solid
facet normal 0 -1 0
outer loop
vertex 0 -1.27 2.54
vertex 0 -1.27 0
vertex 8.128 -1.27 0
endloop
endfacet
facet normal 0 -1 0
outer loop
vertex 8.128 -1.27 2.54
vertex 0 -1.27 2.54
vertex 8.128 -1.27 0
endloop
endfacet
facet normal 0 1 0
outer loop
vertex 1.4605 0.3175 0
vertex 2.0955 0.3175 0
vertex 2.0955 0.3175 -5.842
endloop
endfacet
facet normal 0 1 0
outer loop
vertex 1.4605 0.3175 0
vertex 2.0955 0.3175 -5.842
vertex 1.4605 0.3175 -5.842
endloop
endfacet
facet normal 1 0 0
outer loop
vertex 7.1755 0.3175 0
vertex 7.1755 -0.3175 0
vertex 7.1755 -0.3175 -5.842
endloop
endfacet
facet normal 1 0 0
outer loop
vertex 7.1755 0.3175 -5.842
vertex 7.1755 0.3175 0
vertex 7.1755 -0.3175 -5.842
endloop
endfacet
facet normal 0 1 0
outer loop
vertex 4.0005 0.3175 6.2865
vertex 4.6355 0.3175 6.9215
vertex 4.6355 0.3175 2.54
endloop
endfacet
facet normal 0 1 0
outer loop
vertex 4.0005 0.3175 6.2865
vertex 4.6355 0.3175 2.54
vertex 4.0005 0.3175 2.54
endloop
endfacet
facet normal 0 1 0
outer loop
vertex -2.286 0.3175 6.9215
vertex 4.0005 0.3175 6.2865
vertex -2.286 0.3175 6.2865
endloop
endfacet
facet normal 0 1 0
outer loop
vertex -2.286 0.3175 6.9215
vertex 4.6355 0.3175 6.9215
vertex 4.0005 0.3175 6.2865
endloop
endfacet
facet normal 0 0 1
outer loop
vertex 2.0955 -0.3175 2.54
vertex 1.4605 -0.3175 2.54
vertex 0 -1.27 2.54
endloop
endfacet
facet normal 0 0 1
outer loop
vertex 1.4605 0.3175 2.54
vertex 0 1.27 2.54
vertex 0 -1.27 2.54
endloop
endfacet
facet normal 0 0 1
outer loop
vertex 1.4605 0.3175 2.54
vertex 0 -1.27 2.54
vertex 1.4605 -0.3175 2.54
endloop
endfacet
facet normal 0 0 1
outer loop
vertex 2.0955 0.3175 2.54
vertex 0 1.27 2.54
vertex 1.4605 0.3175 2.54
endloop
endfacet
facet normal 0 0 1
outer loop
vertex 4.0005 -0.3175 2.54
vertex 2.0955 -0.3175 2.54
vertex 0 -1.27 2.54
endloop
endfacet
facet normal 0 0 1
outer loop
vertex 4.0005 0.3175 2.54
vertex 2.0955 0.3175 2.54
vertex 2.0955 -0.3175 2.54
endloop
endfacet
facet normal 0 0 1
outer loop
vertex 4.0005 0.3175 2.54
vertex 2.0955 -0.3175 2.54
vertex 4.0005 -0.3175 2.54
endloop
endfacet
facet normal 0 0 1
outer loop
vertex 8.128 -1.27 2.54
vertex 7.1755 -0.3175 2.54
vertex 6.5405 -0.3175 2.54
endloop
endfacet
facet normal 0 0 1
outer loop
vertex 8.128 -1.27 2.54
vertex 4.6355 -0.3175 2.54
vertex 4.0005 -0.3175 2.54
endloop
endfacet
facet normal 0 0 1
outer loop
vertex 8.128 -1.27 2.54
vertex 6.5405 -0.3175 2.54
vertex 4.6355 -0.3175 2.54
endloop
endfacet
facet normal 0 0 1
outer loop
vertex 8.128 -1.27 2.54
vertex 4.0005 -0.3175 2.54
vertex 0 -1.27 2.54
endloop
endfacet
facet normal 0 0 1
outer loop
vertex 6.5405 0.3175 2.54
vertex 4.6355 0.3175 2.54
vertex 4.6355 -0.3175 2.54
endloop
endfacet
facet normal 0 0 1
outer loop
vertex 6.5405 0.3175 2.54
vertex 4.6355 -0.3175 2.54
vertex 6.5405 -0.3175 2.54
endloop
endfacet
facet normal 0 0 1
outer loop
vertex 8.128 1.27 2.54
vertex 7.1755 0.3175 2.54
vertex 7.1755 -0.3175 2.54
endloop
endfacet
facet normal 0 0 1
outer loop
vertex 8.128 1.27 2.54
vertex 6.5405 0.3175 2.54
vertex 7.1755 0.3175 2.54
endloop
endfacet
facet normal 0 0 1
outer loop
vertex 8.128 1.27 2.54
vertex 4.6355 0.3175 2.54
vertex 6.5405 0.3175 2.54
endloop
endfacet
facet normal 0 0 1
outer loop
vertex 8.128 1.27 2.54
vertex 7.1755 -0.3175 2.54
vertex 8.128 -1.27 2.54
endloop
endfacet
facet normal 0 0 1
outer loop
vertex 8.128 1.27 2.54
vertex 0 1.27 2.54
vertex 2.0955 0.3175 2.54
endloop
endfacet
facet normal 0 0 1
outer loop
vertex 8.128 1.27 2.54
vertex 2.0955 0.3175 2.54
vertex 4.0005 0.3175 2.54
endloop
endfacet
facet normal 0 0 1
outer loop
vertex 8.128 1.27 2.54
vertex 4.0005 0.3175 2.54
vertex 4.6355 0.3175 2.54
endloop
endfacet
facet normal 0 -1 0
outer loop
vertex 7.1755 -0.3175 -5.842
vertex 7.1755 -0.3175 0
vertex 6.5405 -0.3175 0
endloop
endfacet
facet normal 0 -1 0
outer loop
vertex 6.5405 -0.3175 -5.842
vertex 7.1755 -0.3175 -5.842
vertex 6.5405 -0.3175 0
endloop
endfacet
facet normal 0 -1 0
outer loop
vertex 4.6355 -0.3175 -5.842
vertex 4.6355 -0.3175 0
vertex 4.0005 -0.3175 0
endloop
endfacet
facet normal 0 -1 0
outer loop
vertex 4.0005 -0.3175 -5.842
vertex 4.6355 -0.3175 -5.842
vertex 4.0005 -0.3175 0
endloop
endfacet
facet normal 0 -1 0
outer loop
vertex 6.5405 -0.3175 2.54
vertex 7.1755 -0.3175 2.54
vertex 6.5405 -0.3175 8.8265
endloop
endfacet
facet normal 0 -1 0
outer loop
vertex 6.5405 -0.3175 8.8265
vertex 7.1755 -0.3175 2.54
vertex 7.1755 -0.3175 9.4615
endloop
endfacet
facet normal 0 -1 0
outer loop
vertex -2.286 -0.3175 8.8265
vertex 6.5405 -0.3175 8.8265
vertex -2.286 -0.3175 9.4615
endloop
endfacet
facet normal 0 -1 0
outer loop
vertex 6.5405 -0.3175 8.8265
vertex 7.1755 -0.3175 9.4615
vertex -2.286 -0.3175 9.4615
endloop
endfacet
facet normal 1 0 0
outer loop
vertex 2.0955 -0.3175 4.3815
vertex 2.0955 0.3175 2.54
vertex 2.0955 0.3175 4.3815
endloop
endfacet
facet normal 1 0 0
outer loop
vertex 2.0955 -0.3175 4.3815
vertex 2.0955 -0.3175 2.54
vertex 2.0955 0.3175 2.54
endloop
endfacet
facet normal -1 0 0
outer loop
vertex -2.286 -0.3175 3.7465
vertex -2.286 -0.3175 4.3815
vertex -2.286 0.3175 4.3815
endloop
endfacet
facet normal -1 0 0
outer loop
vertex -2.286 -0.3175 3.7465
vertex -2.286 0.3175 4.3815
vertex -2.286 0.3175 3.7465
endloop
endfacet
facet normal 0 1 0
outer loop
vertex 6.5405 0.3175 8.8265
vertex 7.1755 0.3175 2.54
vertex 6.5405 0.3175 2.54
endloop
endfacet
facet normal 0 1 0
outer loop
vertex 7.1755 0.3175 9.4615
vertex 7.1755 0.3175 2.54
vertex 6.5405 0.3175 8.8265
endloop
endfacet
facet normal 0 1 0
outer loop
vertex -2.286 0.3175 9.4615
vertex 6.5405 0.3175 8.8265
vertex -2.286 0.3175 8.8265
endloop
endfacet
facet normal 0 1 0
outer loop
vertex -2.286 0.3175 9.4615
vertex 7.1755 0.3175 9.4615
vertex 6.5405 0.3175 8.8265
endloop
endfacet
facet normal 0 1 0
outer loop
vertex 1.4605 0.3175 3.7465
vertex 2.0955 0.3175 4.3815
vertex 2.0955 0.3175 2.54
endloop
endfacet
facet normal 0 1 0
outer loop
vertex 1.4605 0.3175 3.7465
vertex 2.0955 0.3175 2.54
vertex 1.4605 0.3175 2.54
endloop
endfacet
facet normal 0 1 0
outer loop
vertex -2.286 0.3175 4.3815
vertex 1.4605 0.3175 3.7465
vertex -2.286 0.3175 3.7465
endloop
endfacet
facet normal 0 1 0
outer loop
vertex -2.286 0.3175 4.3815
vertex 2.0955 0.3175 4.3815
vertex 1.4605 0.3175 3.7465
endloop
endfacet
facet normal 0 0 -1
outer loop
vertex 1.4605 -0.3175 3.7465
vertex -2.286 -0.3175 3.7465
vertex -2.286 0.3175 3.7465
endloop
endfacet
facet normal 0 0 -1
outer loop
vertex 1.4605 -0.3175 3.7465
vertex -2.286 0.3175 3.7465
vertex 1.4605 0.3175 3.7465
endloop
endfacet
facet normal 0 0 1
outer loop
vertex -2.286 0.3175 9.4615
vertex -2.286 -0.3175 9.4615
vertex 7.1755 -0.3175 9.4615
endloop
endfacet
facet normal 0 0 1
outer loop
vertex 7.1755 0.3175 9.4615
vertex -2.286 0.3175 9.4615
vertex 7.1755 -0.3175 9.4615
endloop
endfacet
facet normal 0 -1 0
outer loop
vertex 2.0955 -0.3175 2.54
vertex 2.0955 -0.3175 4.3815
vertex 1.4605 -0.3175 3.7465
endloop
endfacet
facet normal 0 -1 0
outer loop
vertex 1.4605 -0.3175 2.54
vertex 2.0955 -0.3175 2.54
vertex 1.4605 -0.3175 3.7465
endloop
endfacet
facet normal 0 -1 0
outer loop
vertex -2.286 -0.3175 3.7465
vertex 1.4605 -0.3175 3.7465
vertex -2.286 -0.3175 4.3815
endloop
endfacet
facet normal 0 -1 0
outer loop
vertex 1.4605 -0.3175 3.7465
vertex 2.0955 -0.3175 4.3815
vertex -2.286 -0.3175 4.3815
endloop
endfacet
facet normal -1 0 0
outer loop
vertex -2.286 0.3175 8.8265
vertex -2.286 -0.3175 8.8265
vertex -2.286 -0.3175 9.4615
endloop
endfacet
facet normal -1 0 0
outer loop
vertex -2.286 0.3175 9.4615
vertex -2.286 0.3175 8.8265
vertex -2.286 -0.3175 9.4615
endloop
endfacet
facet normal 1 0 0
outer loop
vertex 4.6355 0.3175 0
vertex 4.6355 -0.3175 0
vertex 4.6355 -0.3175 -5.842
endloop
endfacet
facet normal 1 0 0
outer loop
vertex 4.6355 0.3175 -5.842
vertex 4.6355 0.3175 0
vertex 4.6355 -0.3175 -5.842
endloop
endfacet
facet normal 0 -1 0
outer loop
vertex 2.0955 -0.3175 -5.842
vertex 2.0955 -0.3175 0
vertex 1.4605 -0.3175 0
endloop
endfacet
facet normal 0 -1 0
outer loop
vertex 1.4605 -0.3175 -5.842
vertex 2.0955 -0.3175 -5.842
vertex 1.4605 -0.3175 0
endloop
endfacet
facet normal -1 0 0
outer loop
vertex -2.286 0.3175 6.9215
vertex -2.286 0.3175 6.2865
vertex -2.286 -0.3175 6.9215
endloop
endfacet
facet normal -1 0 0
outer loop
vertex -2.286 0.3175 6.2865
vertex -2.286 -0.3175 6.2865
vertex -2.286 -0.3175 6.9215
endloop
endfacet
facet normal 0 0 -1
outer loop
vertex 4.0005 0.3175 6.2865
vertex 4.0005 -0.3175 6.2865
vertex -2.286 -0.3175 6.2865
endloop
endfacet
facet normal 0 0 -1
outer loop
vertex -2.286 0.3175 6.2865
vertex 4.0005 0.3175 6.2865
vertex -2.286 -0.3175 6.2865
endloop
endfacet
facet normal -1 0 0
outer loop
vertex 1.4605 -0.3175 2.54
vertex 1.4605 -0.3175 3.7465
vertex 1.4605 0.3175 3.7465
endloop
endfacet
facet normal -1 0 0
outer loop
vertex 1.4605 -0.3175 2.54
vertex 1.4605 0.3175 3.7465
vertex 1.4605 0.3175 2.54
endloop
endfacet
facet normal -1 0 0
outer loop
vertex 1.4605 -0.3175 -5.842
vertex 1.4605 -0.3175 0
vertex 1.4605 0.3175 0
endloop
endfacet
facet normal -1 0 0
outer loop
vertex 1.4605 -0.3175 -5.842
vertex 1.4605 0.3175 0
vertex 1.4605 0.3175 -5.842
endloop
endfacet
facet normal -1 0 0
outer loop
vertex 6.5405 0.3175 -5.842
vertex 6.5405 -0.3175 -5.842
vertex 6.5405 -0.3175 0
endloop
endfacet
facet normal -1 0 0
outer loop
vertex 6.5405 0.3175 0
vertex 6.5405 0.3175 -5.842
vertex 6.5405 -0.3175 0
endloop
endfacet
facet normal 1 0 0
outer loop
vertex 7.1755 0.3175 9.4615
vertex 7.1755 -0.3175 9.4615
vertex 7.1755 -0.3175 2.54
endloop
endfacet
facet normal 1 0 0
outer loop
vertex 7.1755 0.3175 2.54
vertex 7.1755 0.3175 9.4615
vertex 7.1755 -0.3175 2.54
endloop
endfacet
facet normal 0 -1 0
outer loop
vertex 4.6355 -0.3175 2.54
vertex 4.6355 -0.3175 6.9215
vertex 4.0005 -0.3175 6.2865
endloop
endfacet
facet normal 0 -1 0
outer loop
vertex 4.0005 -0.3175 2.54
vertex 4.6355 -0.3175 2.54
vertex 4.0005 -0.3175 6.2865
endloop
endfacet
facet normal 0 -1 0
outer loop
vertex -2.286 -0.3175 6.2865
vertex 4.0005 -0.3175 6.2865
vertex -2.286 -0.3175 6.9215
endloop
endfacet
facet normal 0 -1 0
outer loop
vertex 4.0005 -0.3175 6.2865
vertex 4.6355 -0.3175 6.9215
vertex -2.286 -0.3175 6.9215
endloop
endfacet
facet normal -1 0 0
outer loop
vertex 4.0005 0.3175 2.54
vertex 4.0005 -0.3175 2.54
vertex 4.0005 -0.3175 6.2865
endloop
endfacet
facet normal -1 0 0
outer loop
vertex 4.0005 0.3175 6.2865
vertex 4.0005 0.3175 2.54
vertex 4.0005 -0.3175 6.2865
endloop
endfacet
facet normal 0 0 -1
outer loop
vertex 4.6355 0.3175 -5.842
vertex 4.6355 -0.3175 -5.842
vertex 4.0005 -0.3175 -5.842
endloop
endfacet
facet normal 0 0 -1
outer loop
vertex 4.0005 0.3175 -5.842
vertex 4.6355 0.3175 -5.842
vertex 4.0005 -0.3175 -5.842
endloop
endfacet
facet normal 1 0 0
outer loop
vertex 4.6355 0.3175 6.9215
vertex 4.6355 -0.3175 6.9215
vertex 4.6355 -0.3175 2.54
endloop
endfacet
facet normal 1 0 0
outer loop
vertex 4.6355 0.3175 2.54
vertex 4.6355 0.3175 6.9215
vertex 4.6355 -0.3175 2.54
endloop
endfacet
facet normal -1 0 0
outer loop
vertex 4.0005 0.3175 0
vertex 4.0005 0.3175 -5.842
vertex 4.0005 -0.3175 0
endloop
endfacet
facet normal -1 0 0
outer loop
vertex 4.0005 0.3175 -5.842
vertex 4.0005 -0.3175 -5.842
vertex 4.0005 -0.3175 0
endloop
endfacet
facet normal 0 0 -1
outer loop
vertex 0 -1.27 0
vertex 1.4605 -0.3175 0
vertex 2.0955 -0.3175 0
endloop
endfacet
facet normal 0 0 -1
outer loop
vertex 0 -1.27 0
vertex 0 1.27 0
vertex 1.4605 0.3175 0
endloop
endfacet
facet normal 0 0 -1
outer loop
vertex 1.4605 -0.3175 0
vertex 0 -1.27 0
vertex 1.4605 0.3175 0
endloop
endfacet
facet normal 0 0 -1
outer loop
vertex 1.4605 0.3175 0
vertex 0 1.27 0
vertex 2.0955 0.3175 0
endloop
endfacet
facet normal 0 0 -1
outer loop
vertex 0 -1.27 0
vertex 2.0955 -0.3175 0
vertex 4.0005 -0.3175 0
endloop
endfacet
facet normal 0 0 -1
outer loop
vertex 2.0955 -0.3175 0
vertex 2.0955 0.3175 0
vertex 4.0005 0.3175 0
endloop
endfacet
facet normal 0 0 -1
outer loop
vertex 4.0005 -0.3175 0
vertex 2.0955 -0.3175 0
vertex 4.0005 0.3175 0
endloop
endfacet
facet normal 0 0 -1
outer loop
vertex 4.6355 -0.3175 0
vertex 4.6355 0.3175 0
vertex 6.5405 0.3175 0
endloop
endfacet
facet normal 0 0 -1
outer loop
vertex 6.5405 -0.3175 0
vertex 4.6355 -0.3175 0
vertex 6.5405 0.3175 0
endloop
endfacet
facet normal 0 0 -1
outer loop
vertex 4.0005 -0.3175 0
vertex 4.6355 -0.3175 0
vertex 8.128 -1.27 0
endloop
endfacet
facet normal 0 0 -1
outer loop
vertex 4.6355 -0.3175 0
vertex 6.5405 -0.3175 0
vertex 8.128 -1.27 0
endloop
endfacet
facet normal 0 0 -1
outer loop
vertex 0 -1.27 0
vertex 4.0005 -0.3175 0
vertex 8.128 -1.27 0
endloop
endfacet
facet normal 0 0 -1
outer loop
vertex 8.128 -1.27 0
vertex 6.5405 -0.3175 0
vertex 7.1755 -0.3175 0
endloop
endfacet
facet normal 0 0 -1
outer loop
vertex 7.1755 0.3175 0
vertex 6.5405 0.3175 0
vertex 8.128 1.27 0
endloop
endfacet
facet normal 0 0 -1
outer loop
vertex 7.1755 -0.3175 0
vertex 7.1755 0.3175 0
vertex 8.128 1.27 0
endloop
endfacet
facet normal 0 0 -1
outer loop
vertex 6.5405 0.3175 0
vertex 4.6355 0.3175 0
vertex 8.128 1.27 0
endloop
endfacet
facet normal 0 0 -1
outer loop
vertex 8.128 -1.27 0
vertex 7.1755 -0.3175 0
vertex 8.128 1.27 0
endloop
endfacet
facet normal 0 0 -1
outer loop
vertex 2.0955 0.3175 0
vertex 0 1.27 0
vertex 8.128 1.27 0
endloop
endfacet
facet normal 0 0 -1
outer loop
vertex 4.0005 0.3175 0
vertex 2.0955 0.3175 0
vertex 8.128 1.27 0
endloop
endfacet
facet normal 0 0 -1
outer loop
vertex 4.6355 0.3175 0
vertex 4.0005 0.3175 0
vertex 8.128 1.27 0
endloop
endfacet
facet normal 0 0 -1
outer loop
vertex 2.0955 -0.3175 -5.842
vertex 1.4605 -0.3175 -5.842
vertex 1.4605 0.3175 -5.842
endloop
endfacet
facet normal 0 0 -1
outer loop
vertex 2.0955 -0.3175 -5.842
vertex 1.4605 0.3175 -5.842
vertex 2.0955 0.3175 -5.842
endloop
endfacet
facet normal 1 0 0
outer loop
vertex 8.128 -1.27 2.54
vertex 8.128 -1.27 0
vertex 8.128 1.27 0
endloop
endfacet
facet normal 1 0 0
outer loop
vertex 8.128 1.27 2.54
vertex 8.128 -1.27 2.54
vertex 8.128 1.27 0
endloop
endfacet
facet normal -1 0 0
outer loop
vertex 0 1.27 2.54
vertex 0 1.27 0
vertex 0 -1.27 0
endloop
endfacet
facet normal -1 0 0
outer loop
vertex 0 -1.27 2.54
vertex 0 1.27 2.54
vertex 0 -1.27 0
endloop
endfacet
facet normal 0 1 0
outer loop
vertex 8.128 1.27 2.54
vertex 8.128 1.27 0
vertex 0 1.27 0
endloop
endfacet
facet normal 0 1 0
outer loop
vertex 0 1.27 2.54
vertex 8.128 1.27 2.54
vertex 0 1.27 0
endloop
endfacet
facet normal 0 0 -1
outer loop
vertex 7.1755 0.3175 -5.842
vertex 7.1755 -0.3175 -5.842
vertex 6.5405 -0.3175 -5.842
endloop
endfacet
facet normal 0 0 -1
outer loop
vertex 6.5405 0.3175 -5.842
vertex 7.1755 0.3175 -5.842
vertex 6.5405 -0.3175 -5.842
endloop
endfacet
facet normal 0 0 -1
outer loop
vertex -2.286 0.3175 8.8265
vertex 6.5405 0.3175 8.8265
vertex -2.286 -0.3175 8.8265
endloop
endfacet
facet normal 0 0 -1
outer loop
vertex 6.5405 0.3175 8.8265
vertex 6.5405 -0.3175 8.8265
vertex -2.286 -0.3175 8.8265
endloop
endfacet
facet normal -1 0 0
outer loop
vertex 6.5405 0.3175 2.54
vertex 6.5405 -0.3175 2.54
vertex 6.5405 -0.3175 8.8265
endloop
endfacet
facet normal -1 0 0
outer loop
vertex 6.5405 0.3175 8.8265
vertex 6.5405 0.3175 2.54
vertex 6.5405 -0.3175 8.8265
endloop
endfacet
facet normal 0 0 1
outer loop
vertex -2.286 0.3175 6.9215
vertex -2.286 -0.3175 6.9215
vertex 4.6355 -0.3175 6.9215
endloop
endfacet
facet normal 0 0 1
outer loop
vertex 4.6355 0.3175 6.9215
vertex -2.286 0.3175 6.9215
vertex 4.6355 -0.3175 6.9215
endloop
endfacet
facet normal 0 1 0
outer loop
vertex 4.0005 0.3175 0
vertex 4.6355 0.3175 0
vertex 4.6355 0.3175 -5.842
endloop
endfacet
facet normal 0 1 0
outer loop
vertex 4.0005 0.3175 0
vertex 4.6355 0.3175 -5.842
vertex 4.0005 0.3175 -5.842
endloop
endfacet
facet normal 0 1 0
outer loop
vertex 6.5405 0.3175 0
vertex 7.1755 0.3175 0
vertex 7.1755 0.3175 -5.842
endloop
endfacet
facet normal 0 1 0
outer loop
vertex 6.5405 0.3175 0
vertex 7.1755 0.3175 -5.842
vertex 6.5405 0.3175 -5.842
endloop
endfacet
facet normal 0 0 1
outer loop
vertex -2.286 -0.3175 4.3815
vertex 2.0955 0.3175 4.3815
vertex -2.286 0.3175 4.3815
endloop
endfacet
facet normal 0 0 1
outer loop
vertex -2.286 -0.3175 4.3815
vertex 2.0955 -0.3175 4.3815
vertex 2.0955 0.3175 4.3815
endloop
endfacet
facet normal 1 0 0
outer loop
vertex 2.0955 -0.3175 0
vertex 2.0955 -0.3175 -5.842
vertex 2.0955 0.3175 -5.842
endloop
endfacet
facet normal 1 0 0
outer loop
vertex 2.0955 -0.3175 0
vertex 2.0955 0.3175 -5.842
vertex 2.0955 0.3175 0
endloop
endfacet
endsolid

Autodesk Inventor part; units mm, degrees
ref_plane "YZ Plane" through (0, 0, 0) normal (1, 0, 0) x (0, 1, 0)
ref_plane "XZ Plane" through (0, 0, 0) normal (0, 1, 0) x (-1, 0, 0)
ref_plane "XY Plane" through (0, 0, 0) normal (0, 0, 1) x (1, 0, 0)
sketch "Sketch1" plane through (0, 0, 0) normal (0, 1, 0) x (-1, 0, 0)
  line L0 (-1.4605, -5.842) -> (-2.0955, -5.842)
  line L1 (-2.0955, -5.842) -> (-2.0955, 4.3815)
  line L2 (-2.0955, 4.3815) -> (2.286, 4.3815)
  line L3 (2.286, 4.3815) -> (2.286, 3.7465)
  line L4 (2.286, 3.7465) -> (-1.4605, 3.7465)
  line L5 (-1.4605, 3.7465) -> (-1.4605, -5.842)
  line L6 (2.286, 6.2865) -> (2.286, 6.9215)
  line L7 (2.286, 6.9215) -> (-4.6355, 6.9215)
  line L8 (-4.6355, 6.9215) -> (-4.6355, -5.842)
  line L9 (-4.6355, -5.842) -> (-4.0005, -5.842)
  line L10 (-4.0005, -5.842) -> (-4.0005, 6.2865)
  line L11 (-4.0005, 6.2865) -> (2.286, 6.2865)
  line L12 (2.286, 8.8265) -> (2.286, 9.4615)
  line L13 (2.286, 9.4615) -> (-7.1755, 9.4615)
  line L14 (-7.1755, 9.4615) -> (-7.1755, -5.842)
  line L15 (-7.1755, -5.842) -> (-6.5405, -5.842)
  line L16 (-6.5405, -5.842) -> (-6.5405, 8.8265)
  line L17 (-6.5405, 8.8265) -> (2.286, 8.8265)
  line L18 (2.286, 4.064) -> (9.1077, 4.064) construction
  line L19 (2.286, 6.604) -> (8.649, 6.604) construction
  line L20 (2.286, 9.144) -> (8.4197, 9.144) construction
  line L21 (-1.778, -5.842) -> (-1.778, -10.327) construction
  line L22 (-4.318, -5.842) -> (-4.318, -10.188) construction
  line L23 (-6.858, -5.842) -> (-6.858, -10.8865) construction
  line L24 (12.5548, 0) -> (-11.5751, 0) construction
  line L25 (0, -14.9561) -> (0, 13.5311) construction
  line L26 (0, 0) -> (-8.128, 0) construction
  line L27 (-8.128, 0) -> (-8.128, 2.54) construction
  line L28 (-8.128, 2.54) -> (0, 2.54) construction
  line L29 (0, 2.54) -> (0, 0) construction
  line L30 (-2.54, 0) -> (-2.54, 2.54) construction
  dimension "d24" = 2.54
  dimension "d25" = 2.54
  dimension "d26" = 2.54
  dimension "d27" = 2.54
  dimension "d29" = 0.635
  dimension "d30" = 5.842
  dimension "d32" = 2.54
  dimension "d33" = 8.128
  dimension "d34" = 2.286
  dimension "d35" = 1.778
  dimension "d36" = 1.524
  dimension "d44" = 2.54
  dimension "d45" = 4.826
extrude "Extrusion1" add sketch "Sketch1" along normal mid plane 0.635
sketch "Sketch3" plane through (0, 0, 0) normal (0, 0, 1) x (1, 0, 0)
  line L0 (0, -1.27) -> (8.128, -1.27)
  line L1 (8.128, -1.27) -> (8.128, 1.27)
  line L2 (8.128, 1.27) -> (0, 1.27)
  line L3 (0, 1.27) -> (0, -1.27)
  line L4 (1.4605, 0.3175) -> (1.4605, -0.3175) projected
  line L5 (1.4605, -0.3175) -> (1.4605, 0.3175) projected
  line L6 (2.0955, 0.3175) -> (1.4605, 0.3175) projected
  line L7 (1.4605, 0.3175) -> (-2.286, 0.3175) projected
  line L8 (-2.286, 0.3175) -> (2.0955, 0.3175) projected
  line L9 (1.4605, -0.3175) -> (2.0955, -0.3175) projected
  line L10 (2.0955, -0.3175) -> (-2.286, -0.3175) projected
  line L11 (-2.286, -0.3175) -> (1.4605, -0.3175) projected
  line L12 (1.4605, 0) -> (0, 0) construction
  line L13 (7.1755, -0.3175) -> (7.1755, 0.3175) construction
  line L14 (7.1755, -0.3175) -> (7.1755, 0.3175) construction
  point P0 (0, 0)
  dimension "d37" = 2.54
  dimension "d38" = 8.128
  dimension "d39" = 1.4605
  dimension "d40" = 0.9525
extrude "Extrusion3" add sketch "Sketch3" along normal blind 2.54
properties part number "HeaderRight3"
